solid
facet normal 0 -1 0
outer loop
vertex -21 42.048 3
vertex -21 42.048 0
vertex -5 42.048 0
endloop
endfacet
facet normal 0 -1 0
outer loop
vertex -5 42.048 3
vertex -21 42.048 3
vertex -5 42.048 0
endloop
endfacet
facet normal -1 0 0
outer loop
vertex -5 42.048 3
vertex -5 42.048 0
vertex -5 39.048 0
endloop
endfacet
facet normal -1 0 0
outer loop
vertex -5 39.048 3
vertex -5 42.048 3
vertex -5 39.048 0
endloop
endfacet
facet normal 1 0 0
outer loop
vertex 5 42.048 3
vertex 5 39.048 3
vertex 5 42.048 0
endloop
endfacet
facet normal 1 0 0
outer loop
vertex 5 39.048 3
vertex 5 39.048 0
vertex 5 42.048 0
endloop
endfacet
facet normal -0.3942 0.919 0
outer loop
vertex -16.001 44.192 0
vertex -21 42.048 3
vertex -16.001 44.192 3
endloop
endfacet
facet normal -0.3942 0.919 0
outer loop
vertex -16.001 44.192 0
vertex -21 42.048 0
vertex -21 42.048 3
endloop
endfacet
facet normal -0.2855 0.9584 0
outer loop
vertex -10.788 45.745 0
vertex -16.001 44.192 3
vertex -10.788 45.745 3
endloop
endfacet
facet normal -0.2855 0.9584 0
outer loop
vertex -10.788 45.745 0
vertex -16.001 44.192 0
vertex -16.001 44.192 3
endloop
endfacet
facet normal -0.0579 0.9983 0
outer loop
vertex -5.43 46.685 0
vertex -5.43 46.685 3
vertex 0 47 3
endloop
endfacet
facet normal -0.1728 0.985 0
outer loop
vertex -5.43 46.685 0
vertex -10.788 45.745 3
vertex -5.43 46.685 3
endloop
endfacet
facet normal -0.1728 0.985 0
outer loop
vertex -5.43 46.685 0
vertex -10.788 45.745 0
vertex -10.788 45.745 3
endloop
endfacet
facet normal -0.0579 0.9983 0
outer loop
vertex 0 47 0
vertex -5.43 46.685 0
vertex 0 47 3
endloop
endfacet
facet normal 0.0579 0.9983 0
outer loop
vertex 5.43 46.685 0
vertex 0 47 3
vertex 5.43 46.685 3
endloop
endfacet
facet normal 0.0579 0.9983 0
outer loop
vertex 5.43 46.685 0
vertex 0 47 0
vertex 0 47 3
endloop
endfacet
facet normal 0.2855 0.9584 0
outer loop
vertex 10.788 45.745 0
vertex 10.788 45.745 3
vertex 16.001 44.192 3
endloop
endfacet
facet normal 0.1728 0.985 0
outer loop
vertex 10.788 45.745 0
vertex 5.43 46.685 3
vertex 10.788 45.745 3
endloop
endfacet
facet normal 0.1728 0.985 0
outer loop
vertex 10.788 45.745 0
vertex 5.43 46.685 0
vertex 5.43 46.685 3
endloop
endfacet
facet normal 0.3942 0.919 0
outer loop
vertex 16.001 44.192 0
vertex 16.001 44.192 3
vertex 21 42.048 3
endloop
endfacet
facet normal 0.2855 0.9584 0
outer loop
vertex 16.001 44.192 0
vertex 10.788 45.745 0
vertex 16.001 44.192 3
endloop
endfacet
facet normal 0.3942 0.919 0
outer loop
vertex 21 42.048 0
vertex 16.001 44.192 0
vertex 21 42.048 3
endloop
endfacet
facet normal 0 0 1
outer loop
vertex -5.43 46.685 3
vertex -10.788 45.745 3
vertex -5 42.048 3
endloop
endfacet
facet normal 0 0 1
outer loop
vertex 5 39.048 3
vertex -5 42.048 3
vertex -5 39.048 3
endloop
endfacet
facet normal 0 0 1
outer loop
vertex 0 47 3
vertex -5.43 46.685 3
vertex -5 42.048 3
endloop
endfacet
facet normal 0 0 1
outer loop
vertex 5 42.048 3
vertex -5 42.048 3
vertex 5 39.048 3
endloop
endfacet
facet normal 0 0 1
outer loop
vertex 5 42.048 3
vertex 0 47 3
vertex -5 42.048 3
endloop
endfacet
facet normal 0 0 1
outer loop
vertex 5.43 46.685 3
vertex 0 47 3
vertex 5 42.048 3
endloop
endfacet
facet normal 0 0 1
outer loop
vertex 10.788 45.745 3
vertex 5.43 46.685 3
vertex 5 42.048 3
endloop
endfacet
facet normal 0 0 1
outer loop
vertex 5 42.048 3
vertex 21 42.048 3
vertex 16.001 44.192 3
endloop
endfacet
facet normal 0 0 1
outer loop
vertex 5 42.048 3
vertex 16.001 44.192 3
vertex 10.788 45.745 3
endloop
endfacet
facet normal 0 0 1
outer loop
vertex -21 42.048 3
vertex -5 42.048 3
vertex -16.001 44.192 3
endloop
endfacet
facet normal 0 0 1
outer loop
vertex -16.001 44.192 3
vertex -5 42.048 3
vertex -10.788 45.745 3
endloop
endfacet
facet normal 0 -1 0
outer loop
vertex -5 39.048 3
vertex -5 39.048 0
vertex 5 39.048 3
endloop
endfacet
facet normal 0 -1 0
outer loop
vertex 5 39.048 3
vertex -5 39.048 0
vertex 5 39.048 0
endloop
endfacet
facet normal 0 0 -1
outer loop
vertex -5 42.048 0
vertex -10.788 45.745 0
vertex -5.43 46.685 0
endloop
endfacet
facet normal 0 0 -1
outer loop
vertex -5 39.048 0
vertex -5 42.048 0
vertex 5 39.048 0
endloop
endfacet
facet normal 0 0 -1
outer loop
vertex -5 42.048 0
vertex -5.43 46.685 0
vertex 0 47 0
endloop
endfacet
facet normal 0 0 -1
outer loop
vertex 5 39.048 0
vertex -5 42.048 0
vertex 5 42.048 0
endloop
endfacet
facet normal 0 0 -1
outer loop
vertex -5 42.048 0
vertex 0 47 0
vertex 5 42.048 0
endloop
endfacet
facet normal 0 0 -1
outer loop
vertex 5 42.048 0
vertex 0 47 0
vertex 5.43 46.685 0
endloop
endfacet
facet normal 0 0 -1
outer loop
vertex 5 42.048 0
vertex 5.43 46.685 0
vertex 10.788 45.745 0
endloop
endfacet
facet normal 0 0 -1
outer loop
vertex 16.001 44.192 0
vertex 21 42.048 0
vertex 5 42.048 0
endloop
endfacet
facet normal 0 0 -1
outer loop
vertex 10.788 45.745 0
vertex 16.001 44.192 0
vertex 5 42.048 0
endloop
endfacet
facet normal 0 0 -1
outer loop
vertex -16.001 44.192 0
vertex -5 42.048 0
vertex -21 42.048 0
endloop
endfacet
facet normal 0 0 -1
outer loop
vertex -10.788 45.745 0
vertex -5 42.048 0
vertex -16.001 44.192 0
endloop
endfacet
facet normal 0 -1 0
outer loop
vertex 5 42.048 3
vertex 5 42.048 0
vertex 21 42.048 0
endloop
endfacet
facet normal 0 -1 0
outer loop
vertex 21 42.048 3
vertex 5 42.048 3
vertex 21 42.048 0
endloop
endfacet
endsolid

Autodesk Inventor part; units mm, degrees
ref_plane "YZ Plane" through (0, 0, 0) normal (1, 0, 0) x (0, 1, 0)
ref_plane "XZ Plane" through (0, 0, 0) normal (0, 1, 0) x (-1, 0, 0)
ref_plane "XY Plane" through (0, 0, 0) normal (0, 0, 1) x (1, 0, 0)
sketch "Sketch1" plane through (0, 0, 0) normal (0, 0, 1) x (1, 0, 0)
  arc A0 (21, 42.0476) -> (-21, 42.0476) centre (0, 0) ccw
  line L0 (-5, 42.0476) -> (-5, 39.0476)
  line L1 (-5, 39.0476) -> (5, 39.0476)
  line L2 (5, 39.0476) -> (5, 42.0476)
  line L3 (-21, 42.0476) -> (-5, 42.0476)
  line L4 (5, 42.0476) -> (21, 42.0476)
  dimension "d0" = 94
  dimension "d2" = 3
  dimension "d3" = 10
  dimension "d4" = 5
  dimension "d8" = 16
  dimension "d9" = 16
extrude "Extrusion1" add sketch "Sketch1" along normal blind 3
properties part number "OpenROV_Dev_EChassis_Blinder"
